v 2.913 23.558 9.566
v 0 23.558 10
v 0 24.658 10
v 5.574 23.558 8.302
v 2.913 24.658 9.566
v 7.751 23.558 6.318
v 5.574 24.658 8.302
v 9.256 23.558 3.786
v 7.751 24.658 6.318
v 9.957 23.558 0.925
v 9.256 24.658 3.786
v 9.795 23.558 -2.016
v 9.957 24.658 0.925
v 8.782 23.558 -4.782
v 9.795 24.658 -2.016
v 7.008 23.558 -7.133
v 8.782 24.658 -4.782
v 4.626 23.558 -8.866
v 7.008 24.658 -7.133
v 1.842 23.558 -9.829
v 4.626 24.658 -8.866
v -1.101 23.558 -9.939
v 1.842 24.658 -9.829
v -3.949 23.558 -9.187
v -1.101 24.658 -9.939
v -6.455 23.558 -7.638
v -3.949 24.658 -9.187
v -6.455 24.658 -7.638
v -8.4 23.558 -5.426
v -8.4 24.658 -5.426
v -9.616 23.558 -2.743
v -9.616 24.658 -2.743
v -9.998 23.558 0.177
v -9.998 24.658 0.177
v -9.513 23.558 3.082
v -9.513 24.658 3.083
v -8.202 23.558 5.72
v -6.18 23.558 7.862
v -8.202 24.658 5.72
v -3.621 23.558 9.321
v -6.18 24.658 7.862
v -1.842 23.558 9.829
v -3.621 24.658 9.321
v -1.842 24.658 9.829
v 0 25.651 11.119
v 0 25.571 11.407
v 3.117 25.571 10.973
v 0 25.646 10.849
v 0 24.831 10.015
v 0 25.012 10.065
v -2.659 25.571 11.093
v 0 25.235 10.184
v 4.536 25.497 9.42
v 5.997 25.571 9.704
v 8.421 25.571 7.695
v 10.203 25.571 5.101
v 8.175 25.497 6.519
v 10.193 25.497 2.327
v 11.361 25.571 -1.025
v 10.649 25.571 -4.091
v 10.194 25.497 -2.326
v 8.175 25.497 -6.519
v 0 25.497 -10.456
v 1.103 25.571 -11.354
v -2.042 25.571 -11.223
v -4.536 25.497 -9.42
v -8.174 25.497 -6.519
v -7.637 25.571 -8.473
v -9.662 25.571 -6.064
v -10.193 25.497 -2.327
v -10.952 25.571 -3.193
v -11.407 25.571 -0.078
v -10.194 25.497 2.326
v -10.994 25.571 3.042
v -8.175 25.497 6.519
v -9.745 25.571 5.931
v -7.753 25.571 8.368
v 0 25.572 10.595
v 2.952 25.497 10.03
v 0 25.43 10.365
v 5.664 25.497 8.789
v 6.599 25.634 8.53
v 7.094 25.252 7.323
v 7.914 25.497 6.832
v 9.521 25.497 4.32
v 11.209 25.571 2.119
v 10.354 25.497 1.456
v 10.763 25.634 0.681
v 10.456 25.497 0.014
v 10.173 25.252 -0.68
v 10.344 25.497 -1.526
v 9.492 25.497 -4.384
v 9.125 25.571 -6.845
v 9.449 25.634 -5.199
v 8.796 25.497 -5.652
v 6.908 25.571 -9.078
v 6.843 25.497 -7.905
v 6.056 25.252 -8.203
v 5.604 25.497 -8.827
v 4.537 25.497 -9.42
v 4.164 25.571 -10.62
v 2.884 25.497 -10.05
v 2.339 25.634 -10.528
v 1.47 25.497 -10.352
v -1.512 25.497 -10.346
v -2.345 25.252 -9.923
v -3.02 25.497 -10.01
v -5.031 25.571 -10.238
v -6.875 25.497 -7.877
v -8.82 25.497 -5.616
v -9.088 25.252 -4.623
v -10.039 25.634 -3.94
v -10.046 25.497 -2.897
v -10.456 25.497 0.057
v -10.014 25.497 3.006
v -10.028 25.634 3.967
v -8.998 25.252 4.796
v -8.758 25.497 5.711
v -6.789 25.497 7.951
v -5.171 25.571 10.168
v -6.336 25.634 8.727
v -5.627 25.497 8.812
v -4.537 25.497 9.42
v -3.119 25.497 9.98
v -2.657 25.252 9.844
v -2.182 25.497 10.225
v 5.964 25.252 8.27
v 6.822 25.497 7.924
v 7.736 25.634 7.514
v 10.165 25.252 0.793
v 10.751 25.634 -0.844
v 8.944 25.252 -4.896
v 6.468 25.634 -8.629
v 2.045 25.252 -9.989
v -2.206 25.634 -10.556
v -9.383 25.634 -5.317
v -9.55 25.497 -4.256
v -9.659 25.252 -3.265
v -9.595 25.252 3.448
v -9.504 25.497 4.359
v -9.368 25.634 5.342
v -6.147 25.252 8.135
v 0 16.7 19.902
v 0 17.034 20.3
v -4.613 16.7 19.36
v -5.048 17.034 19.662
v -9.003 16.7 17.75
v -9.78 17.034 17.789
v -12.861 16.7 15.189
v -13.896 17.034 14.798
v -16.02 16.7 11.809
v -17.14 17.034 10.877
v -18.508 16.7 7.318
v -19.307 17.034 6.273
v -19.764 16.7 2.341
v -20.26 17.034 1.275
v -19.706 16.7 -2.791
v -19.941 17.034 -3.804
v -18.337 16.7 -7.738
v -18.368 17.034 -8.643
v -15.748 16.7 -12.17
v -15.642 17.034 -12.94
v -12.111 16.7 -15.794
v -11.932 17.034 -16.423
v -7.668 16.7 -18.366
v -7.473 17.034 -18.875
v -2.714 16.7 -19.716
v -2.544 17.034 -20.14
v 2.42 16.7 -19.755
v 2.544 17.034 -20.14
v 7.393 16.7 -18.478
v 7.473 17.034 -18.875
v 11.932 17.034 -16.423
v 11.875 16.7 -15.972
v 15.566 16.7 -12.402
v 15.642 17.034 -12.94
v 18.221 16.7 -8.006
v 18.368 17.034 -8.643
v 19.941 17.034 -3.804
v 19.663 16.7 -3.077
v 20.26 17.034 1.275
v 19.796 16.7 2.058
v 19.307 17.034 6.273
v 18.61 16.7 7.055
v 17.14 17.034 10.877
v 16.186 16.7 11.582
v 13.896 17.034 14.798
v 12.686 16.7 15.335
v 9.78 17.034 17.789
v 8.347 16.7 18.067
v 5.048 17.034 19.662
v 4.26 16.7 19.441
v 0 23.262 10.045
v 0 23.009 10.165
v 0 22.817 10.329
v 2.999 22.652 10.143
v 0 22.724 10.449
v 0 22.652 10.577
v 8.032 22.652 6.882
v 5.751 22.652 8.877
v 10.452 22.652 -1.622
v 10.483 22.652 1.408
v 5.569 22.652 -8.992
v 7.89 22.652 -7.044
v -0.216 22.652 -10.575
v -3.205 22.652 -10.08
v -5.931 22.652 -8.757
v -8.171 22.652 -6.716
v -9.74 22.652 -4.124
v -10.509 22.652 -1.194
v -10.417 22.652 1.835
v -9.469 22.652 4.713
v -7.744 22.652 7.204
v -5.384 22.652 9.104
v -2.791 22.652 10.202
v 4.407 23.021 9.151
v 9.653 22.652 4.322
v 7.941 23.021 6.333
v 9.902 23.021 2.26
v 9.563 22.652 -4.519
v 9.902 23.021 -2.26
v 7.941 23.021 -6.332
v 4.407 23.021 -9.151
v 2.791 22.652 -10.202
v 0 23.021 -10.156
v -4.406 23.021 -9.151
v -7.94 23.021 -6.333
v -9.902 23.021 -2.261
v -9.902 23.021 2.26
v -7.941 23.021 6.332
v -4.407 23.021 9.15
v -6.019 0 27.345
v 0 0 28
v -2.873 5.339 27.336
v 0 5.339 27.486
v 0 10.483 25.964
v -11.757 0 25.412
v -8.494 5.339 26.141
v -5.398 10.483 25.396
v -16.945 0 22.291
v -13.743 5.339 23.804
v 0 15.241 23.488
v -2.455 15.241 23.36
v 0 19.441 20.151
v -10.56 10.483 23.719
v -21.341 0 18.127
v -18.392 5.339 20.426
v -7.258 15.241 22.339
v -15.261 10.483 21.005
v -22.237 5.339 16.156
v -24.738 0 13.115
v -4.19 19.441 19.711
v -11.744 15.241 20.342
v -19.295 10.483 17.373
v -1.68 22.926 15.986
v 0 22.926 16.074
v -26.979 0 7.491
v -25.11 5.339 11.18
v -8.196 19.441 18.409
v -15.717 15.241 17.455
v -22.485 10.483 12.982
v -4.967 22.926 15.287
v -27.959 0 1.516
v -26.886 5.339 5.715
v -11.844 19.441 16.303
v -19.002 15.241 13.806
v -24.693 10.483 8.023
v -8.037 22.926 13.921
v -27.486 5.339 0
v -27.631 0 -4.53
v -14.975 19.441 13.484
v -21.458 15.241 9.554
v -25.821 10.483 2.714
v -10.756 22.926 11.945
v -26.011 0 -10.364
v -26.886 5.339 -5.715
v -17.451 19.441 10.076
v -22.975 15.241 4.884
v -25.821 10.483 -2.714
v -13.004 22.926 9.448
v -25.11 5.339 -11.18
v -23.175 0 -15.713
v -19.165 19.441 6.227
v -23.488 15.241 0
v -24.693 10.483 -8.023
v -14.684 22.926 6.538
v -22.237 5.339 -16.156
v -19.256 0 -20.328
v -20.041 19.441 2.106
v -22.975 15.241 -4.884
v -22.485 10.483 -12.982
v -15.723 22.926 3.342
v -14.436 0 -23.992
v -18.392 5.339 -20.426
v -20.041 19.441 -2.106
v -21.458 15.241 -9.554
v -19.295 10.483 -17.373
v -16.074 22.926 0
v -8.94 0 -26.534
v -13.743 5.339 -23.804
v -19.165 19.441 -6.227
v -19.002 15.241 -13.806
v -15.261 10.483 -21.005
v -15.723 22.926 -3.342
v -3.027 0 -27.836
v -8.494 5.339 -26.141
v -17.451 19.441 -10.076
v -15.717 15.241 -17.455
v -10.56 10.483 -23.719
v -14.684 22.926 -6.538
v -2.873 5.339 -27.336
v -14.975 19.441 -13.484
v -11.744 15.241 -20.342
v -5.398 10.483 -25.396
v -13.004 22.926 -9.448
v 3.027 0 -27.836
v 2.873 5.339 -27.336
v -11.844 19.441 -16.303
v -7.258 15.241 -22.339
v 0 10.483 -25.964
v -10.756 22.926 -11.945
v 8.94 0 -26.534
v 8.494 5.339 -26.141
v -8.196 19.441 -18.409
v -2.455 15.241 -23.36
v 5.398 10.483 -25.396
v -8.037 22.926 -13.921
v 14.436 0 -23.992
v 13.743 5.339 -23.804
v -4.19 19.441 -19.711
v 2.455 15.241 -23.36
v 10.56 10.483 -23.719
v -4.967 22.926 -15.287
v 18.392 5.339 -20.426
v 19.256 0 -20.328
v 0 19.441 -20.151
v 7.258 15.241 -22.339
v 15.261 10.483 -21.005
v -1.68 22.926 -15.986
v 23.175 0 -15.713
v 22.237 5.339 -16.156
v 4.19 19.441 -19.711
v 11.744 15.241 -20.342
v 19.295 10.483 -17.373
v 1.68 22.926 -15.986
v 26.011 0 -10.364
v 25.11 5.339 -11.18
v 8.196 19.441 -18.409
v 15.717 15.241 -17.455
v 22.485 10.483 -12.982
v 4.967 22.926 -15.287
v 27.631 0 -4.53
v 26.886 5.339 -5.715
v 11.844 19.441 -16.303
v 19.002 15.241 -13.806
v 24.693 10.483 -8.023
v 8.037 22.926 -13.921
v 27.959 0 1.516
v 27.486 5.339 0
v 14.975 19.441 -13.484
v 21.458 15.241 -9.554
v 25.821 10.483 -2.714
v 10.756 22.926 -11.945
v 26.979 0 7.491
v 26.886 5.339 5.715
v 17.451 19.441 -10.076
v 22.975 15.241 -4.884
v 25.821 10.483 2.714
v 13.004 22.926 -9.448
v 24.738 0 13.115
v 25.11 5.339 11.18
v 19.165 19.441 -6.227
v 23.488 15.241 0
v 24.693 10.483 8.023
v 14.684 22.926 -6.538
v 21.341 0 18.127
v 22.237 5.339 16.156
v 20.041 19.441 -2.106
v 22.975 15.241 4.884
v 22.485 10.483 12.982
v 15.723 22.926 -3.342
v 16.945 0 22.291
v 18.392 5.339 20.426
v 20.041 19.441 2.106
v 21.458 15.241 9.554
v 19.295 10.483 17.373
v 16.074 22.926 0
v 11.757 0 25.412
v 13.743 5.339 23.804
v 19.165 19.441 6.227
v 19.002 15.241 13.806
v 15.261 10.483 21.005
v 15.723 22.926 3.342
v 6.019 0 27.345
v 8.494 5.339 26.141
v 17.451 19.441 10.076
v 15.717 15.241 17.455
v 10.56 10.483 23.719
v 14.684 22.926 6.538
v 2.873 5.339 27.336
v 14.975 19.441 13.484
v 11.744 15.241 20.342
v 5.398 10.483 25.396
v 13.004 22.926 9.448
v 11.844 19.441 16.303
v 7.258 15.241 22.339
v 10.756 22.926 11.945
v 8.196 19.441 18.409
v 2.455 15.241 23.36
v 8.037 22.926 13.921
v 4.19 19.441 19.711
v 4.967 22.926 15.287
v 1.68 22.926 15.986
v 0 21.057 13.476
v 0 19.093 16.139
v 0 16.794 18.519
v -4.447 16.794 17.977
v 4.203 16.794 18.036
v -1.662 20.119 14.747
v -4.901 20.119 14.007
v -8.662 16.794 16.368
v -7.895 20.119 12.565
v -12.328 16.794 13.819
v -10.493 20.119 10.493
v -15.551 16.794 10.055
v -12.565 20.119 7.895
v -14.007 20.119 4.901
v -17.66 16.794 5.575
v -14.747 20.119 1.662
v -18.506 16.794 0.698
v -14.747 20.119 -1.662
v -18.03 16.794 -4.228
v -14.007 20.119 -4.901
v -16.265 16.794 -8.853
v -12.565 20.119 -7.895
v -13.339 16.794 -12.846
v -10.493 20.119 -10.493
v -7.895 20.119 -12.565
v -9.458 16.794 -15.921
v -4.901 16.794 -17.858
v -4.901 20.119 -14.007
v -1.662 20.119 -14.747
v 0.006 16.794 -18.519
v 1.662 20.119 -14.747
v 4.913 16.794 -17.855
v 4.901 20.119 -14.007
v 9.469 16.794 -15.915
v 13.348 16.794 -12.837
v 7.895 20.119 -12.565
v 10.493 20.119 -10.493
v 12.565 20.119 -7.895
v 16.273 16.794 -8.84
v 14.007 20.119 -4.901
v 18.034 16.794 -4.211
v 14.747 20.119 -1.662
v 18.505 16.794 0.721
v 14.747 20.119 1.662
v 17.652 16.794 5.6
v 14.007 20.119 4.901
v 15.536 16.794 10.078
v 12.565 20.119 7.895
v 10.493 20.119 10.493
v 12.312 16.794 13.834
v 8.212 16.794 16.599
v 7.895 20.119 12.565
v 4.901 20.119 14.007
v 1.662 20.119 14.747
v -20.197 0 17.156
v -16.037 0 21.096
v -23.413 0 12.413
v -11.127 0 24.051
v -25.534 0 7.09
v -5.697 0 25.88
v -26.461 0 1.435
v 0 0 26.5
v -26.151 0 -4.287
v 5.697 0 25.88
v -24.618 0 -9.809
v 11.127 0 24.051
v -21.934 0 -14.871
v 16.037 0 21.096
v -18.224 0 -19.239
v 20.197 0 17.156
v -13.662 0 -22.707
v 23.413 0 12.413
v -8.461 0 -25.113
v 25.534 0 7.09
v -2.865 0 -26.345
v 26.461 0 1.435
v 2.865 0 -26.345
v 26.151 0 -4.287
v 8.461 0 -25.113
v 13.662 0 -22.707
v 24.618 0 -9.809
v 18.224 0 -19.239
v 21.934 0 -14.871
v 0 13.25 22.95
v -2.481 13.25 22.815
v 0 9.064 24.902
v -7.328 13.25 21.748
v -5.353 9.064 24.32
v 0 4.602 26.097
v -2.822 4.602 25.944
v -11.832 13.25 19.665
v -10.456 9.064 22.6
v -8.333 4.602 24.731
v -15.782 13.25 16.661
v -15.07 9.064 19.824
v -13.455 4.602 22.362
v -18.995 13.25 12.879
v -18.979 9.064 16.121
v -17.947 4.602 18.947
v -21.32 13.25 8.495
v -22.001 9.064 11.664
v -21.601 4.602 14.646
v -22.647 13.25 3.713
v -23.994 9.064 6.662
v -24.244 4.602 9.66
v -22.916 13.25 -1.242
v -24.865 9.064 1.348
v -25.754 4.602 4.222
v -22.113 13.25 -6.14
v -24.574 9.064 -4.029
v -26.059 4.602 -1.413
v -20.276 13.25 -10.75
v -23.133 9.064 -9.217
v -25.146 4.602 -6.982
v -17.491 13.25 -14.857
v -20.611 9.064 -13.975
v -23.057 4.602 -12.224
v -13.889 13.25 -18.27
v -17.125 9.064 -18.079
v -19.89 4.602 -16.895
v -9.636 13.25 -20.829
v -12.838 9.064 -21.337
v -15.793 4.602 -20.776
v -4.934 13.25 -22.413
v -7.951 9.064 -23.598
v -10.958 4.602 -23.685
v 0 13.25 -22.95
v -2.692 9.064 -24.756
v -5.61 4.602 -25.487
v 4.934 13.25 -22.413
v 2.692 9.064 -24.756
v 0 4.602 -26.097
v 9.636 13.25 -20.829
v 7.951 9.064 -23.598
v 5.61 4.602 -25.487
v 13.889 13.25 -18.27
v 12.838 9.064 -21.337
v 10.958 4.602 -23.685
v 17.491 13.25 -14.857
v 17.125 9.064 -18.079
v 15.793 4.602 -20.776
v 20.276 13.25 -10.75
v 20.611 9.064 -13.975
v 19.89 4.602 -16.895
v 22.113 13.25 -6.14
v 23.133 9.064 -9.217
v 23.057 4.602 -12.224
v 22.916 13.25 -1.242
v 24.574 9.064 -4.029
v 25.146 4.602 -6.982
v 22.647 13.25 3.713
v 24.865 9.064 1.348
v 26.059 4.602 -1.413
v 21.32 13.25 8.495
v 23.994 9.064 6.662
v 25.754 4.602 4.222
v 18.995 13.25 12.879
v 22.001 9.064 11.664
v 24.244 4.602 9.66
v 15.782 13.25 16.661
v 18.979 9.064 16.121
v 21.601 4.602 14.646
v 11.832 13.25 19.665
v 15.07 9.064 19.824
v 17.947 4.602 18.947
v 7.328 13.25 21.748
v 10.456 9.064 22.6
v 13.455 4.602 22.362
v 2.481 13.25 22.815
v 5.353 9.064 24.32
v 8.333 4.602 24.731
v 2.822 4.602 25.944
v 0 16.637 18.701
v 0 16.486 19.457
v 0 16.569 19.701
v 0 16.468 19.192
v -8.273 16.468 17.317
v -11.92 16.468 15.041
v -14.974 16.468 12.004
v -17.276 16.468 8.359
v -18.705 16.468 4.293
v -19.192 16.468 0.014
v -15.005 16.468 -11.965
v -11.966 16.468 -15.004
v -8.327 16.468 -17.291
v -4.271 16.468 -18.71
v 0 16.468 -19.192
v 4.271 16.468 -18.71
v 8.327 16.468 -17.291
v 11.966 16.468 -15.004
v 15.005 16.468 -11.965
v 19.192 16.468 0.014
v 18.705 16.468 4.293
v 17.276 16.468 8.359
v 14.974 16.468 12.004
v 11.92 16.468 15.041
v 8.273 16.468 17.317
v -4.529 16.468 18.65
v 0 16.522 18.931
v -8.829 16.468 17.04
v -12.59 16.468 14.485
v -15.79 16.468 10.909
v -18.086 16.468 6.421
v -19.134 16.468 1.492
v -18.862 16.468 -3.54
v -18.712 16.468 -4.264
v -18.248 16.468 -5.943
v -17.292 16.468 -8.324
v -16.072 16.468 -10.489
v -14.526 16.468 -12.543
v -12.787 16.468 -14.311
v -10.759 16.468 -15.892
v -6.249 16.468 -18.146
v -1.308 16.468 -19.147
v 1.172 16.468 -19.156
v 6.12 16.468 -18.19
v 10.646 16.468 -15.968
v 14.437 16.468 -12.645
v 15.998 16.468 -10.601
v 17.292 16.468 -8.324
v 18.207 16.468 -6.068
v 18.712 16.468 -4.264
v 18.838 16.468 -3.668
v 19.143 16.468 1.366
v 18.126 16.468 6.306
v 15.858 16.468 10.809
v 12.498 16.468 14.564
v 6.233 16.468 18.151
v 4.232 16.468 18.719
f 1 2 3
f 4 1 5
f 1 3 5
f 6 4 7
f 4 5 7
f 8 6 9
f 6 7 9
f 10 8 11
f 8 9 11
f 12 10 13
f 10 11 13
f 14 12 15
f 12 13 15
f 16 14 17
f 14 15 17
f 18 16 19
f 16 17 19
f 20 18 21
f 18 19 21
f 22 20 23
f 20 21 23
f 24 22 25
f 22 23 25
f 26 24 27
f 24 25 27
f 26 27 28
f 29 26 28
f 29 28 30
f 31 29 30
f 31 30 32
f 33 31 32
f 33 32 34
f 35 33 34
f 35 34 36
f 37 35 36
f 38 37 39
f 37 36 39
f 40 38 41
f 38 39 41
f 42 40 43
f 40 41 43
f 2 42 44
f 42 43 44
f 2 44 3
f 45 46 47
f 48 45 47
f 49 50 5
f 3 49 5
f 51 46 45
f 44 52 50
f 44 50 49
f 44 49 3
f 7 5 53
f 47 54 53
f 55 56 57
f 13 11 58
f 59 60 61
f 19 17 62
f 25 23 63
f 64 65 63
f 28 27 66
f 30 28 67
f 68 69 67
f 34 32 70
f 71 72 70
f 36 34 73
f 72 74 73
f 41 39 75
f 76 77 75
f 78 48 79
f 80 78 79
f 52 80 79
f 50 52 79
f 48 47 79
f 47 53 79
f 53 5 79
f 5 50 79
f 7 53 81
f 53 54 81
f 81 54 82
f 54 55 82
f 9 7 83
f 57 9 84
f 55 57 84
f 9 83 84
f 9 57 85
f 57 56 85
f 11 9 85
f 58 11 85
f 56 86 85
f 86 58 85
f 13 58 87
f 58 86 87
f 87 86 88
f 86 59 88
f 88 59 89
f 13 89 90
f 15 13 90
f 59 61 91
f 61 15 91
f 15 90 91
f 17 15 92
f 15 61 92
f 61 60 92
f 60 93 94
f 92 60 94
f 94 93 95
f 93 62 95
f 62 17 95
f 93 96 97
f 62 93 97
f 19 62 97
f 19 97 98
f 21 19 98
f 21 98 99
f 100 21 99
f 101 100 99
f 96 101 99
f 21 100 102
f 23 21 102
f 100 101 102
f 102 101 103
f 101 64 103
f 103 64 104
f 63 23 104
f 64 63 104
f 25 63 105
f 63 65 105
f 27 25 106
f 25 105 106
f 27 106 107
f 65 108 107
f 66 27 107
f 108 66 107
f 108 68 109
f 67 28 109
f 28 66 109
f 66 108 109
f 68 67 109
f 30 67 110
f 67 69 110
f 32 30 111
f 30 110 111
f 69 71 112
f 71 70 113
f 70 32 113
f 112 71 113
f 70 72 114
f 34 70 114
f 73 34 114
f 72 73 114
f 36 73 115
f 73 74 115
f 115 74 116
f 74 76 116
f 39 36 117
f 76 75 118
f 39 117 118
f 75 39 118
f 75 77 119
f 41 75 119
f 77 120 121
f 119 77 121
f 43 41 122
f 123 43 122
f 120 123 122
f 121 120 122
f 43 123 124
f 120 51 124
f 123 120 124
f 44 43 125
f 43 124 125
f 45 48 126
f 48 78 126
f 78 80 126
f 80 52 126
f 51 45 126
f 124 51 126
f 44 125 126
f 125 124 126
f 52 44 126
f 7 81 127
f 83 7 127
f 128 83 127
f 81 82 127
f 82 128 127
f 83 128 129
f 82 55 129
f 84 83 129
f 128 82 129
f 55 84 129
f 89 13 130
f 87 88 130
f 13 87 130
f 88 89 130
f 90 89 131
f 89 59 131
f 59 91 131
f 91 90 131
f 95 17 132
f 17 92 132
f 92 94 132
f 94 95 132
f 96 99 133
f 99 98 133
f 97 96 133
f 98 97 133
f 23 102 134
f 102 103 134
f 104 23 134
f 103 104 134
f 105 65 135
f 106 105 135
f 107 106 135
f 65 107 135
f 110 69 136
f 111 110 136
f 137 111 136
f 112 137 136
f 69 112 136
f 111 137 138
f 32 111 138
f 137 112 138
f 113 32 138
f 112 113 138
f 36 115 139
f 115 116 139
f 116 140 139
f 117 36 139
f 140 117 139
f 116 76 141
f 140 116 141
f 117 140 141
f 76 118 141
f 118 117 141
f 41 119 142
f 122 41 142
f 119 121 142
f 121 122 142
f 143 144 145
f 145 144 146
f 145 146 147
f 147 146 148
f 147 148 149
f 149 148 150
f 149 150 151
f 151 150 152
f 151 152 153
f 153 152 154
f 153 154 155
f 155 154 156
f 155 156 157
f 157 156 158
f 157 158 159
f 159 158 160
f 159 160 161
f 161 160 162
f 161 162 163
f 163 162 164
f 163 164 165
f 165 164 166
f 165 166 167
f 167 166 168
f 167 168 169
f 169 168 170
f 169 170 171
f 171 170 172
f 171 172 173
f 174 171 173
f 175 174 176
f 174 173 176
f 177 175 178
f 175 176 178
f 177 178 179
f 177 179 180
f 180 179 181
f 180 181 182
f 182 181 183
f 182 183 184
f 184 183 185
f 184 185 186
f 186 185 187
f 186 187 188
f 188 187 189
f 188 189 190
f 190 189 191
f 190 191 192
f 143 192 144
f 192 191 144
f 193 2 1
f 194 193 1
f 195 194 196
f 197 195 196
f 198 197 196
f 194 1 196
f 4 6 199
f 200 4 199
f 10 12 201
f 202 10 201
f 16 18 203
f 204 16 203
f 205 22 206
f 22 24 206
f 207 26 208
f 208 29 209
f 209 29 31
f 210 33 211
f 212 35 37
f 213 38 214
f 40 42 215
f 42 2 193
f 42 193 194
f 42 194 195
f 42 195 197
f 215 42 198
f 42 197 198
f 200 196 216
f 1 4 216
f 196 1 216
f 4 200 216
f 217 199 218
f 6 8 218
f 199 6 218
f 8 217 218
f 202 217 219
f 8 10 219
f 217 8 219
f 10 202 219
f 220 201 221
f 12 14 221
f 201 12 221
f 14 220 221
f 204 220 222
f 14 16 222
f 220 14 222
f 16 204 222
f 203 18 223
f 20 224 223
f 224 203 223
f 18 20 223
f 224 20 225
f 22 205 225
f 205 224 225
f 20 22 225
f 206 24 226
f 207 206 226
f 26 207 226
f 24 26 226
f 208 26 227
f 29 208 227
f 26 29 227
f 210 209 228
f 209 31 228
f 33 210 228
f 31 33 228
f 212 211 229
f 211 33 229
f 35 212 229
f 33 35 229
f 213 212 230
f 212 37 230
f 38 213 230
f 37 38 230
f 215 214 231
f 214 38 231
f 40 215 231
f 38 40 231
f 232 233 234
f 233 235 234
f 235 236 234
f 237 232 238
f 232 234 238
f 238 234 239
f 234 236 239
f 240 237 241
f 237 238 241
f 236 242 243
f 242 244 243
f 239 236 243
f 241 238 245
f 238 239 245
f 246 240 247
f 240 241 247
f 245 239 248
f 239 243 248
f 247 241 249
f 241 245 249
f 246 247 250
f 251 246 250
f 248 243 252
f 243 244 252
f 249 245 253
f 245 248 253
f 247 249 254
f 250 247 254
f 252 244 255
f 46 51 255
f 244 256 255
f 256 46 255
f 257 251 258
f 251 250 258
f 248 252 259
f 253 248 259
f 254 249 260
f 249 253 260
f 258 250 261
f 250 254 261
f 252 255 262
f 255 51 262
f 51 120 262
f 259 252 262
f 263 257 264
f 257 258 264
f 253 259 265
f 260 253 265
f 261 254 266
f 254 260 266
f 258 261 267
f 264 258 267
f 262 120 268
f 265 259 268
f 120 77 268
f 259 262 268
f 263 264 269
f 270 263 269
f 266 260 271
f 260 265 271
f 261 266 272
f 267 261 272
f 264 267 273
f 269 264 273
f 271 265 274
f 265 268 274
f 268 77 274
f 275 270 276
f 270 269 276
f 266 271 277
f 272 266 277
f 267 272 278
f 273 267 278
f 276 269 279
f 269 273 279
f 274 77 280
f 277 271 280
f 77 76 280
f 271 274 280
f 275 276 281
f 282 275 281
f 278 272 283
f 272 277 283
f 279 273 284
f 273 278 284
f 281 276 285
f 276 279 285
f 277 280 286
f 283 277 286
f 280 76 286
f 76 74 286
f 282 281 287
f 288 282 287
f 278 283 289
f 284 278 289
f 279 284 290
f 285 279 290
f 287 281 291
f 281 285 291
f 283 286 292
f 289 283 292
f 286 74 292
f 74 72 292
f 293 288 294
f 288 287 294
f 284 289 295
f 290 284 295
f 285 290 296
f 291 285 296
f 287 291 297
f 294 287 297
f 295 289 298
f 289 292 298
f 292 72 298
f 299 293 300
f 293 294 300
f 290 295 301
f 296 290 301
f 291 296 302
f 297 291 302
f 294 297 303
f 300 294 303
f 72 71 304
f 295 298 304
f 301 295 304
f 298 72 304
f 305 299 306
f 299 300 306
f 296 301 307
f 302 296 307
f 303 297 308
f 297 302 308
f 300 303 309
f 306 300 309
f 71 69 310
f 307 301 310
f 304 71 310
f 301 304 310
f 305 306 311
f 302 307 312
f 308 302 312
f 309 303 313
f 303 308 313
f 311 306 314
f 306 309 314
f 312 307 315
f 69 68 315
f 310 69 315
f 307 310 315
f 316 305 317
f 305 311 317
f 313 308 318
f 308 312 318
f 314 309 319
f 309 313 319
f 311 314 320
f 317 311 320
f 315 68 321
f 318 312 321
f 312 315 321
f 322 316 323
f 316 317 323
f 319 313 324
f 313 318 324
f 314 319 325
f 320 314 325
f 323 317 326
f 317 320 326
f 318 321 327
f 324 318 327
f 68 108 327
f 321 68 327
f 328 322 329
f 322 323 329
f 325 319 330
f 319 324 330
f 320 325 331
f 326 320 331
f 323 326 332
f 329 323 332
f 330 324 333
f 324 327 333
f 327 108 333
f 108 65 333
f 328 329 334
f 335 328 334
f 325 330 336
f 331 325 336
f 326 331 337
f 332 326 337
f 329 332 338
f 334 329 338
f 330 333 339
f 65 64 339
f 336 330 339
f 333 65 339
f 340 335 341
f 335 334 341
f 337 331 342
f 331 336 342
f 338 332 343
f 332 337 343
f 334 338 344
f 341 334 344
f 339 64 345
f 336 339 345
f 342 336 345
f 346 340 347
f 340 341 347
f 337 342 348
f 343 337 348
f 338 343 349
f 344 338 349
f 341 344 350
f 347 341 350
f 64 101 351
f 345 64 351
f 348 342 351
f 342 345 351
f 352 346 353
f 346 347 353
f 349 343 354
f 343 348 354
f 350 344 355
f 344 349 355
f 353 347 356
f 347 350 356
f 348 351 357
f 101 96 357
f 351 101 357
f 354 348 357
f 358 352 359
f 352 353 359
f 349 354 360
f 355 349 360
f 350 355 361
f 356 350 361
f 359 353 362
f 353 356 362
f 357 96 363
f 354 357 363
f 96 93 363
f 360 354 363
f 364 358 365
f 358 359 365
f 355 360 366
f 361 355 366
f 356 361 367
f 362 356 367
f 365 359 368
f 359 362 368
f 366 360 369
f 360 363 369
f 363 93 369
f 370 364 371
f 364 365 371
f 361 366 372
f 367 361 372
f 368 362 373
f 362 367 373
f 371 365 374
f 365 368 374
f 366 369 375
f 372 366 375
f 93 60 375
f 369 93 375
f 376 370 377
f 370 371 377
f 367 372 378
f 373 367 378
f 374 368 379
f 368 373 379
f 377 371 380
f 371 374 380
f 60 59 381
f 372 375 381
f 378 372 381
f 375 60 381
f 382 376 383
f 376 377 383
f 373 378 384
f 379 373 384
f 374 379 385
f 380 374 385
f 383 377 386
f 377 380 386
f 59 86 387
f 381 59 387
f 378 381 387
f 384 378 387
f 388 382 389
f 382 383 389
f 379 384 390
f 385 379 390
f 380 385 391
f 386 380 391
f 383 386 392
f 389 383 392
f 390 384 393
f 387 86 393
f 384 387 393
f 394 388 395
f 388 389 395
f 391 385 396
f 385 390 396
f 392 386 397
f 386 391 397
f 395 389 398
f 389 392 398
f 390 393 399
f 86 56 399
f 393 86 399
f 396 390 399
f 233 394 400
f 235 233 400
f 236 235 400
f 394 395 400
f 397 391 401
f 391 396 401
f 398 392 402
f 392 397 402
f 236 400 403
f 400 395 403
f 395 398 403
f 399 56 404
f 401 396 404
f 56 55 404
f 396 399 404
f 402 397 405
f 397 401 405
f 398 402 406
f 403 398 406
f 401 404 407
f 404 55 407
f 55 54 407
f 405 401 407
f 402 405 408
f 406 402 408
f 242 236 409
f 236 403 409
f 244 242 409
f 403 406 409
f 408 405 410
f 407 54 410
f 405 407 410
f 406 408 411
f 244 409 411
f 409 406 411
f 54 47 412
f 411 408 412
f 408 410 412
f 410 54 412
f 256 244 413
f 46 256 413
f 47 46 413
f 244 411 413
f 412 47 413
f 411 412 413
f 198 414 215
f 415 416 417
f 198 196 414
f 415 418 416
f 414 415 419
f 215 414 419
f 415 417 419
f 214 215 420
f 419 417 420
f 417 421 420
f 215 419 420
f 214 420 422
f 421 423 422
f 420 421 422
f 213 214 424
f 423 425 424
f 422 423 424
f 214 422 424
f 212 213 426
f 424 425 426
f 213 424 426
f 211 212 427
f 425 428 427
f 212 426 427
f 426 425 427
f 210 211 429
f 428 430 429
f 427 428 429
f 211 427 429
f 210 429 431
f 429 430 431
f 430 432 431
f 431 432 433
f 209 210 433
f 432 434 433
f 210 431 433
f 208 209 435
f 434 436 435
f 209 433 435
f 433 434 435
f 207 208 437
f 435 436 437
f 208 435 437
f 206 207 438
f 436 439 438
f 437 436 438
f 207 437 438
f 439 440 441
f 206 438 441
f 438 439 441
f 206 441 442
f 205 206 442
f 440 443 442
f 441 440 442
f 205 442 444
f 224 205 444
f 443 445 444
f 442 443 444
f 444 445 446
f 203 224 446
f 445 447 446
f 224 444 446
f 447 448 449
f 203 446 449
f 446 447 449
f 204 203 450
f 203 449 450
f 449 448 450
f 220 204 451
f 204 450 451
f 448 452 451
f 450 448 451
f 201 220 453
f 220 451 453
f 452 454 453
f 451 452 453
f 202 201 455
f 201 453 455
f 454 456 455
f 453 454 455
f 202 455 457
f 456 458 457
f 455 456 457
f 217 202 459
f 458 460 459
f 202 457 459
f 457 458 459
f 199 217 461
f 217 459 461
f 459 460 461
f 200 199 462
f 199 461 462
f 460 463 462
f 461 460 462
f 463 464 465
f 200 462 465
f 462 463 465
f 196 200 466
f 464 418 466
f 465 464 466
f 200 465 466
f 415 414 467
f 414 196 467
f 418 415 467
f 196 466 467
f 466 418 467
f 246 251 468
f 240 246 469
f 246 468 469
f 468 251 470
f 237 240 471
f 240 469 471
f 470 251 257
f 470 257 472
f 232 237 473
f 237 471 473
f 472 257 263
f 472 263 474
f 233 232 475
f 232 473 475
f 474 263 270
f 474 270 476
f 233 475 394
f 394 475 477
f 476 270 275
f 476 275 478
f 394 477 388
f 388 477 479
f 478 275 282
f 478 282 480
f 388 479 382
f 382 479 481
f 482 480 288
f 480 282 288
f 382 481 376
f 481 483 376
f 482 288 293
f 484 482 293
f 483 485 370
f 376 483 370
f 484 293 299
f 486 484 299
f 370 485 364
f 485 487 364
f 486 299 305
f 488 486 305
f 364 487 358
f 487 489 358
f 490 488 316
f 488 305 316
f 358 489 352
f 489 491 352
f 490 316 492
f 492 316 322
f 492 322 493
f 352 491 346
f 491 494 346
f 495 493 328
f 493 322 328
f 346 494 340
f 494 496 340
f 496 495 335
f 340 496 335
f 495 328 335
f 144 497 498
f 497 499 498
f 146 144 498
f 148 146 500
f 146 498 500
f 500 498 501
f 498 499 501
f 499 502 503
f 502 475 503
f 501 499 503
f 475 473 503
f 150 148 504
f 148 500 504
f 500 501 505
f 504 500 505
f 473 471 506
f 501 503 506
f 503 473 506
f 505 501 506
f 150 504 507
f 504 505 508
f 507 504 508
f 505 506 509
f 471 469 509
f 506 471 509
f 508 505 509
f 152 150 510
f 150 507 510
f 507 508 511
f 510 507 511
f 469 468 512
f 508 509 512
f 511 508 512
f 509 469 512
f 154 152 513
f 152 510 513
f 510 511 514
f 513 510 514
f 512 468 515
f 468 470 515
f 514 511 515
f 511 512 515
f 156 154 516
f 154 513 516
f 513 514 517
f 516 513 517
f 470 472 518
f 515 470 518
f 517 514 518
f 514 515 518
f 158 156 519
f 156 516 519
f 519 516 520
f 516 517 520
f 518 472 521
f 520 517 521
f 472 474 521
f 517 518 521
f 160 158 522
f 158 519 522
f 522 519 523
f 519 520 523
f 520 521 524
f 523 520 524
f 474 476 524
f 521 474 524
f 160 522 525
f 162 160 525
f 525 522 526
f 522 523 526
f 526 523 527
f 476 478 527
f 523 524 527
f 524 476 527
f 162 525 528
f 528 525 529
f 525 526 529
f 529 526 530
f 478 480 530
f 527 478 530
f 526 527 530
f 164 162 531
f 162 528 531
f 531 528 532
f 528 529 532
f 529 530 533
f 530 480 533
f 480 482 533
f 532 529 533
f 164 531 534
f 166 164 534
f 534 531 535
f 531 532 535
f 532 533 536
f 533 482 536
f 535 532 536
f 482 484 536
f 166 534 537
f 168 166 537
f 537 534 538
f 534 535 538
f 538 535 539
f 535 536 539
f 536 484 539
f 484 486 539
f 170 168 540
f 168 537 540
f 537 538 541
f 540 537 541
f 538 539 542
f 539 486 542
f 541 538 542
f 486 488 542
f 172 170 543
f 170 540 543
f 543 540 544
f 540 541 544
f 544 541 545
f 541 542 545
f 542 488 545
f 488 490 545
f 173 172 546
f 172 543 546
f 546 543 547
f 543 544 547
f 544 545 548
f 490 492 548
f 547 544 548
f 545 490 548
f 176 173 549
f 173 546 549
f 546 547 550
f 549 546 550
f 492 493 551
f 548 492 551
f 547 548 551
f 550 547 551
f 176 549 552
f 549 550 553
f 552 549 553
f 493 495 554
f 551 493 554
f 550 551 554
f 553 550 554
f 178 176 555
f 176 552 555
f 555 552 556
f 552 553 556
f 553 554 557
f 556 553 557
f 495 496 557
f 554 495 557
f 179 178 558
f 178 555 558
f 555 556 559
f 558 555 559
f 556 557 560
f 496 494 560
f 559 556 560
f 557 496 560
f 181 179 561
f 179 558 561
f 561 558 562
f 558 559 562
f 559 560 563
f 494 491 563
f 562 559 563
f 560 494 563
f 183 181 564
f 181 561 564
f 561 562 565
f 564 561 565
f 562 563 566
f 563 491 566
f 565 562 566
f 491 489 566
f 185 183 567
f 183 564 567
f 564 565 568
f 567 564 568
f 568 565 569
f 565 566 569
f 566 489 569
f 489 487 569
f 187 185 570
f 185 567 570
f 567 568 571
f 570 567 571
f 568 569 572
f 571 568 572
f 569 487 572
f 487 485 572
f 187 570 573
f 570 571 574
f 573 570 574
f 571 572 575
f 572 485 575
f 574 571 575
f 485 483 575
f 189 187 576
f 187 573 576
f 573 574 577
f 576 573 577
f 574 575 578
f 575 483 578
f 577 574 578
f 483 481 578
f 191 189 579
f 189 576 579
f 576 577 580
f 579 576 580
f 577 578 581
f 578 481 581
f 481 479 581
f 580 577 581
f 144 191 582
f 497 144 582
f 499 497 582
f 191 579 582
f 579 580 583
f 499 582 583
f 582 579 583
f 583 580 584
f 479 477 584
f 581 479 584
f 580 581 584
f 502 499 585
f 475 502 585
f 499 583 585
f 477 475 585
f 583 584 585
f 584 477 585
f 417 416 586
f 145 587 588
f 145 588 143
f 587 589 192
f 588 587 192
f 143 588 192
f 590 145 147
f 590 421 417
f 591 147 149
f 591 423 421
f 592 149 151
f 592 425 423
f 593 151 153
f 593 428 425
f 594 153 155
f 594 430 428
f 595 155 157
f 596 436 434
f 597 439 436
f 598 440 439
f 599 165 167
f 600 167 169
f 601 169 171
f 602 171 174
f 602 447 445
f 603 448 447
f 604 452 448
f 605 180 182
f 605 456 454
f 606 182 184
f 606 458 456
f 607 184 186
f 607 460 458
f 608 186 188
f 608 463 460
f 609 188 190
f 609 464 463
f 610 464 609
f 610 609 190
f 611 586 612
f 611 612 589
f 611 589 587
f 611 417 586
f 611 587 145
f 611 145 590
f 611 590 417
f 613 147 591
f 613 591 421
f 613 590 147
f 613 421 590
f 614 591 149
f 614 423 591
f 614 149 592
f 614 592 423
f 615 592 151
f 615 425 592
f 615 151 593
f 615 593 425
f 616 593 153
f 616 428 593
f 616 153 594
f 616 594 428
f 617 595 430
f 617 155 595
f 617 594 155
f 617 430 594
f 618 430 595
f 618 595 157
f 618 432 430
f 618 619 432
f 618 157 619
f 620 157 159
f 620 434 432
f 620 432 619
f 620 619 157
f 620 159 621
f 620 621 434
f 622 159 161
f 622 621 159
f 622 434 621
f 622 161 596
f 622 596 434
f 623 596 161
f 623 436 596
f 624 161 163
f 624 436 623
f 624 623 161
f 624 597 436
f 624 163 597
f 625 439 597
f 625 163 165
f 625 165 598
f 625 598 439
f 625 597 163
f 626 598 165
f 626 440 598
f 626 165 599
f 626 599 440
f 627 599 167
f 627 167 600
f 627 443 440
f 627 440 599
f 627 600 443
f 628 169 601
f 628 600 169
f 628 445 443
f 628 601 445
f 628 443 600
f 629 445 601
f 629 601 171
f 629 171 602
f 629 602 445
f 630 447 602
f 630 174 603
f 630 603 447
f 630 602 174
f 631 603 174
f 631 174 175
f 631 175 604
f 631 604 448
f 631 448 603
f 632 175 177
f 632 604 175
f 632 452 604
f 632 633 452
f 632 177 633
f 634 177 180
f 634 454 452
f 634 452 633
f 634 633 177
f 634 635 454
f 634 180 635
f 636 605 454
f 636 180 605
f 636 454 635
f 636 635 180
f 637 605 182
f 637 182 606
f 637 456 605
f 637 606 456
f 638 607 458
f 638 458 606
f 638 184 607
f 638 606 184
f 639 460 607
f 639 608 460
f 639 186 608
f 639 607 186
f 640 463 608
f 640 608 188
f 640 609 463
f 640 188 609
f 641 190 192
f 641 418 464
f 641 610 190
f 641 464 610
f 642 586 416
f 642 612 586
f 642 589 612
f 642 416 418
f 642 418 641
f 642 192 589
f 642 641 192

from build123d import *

# Parameters (mm, degrees)
CROQUIS2_W            = 10
CROQUIS2_H            = 14
REDONDEO1_R           = 1
CROQUIS3_R            = 29.845650159
CORTAR_EXTRUIR1_DEPTH = 30


with BuildPart() as part:
    # Croquis1 → Revolución3 (revolve)
    with BuildSketch(Plane(origin=(0, 0, 0), x_dir=(0, 0, -1), z_dir=(1, 0, 0))):
        with BuildLine():
            Line((-0.5, 27.995535358), (-0.5, 26.495282599))
            Line((-0.5, 26.495282599), (-0.5, 24.9949995))
            ThreePointArc((-0.5, 24.9949995), (-10.791516482, 22.5509018), (-19.151111078, 16.069690242))
            Line((-19.151111078, 16.069690242), (-20.300177743, 17.033871657))
            ThreePointArc((-20.300177743, 17.033871657), (-24.017156356, -11.199383936), (0, -26.5))
            Line((0, -26.5), (0, -28))
            ThreePointArc((0, -28), (-27.998883817, -0.250009966), (-0.5, 27.995535358))
        make_face()
    revolve(axis=Axis((0, 29, 0), (0, -1, 0)))

    # Croquis2 → Cortar-Revolución2 (revolve, cut)
    with BuildSketch(Plane(origin=(0, 0, 0), x_dir=(0, 0, -1), z_dir=(1, 0, 0))):
        with Locations((-5, 23)):
            Rectangle(CROQUIS2_W, CROQUIS2_H)
    revolve(axis=Axis((0, 0, 0), (0, 1, 0)), mode=Mode.SUBTRACT)

    # Redondeo1
    redondeo1_edges = [part.edges().sort_by_distance(p)[0] for p in [
        (0, 22.912878475, -10),
        (0, 26.153393661, -10),
        (0, 16.069690242, -19.151111078),
    ]]
    fillet(redondeo1_edges, radius=REDONDEO1_R)

    # Croquis3 → Cortar-Extruir1 (cut)
    with BuildSketch(Plane(origin=(0, 0, 0), x_dir=(1, 0, 0), z_dir=(0, 1, 0))):
        Circle(CROQUIS3_R)
    extrude(amount=-CORTAR_EXTRUIR1_DEPTH, mode=Mode.SUBTRACT)


solid = part.part
